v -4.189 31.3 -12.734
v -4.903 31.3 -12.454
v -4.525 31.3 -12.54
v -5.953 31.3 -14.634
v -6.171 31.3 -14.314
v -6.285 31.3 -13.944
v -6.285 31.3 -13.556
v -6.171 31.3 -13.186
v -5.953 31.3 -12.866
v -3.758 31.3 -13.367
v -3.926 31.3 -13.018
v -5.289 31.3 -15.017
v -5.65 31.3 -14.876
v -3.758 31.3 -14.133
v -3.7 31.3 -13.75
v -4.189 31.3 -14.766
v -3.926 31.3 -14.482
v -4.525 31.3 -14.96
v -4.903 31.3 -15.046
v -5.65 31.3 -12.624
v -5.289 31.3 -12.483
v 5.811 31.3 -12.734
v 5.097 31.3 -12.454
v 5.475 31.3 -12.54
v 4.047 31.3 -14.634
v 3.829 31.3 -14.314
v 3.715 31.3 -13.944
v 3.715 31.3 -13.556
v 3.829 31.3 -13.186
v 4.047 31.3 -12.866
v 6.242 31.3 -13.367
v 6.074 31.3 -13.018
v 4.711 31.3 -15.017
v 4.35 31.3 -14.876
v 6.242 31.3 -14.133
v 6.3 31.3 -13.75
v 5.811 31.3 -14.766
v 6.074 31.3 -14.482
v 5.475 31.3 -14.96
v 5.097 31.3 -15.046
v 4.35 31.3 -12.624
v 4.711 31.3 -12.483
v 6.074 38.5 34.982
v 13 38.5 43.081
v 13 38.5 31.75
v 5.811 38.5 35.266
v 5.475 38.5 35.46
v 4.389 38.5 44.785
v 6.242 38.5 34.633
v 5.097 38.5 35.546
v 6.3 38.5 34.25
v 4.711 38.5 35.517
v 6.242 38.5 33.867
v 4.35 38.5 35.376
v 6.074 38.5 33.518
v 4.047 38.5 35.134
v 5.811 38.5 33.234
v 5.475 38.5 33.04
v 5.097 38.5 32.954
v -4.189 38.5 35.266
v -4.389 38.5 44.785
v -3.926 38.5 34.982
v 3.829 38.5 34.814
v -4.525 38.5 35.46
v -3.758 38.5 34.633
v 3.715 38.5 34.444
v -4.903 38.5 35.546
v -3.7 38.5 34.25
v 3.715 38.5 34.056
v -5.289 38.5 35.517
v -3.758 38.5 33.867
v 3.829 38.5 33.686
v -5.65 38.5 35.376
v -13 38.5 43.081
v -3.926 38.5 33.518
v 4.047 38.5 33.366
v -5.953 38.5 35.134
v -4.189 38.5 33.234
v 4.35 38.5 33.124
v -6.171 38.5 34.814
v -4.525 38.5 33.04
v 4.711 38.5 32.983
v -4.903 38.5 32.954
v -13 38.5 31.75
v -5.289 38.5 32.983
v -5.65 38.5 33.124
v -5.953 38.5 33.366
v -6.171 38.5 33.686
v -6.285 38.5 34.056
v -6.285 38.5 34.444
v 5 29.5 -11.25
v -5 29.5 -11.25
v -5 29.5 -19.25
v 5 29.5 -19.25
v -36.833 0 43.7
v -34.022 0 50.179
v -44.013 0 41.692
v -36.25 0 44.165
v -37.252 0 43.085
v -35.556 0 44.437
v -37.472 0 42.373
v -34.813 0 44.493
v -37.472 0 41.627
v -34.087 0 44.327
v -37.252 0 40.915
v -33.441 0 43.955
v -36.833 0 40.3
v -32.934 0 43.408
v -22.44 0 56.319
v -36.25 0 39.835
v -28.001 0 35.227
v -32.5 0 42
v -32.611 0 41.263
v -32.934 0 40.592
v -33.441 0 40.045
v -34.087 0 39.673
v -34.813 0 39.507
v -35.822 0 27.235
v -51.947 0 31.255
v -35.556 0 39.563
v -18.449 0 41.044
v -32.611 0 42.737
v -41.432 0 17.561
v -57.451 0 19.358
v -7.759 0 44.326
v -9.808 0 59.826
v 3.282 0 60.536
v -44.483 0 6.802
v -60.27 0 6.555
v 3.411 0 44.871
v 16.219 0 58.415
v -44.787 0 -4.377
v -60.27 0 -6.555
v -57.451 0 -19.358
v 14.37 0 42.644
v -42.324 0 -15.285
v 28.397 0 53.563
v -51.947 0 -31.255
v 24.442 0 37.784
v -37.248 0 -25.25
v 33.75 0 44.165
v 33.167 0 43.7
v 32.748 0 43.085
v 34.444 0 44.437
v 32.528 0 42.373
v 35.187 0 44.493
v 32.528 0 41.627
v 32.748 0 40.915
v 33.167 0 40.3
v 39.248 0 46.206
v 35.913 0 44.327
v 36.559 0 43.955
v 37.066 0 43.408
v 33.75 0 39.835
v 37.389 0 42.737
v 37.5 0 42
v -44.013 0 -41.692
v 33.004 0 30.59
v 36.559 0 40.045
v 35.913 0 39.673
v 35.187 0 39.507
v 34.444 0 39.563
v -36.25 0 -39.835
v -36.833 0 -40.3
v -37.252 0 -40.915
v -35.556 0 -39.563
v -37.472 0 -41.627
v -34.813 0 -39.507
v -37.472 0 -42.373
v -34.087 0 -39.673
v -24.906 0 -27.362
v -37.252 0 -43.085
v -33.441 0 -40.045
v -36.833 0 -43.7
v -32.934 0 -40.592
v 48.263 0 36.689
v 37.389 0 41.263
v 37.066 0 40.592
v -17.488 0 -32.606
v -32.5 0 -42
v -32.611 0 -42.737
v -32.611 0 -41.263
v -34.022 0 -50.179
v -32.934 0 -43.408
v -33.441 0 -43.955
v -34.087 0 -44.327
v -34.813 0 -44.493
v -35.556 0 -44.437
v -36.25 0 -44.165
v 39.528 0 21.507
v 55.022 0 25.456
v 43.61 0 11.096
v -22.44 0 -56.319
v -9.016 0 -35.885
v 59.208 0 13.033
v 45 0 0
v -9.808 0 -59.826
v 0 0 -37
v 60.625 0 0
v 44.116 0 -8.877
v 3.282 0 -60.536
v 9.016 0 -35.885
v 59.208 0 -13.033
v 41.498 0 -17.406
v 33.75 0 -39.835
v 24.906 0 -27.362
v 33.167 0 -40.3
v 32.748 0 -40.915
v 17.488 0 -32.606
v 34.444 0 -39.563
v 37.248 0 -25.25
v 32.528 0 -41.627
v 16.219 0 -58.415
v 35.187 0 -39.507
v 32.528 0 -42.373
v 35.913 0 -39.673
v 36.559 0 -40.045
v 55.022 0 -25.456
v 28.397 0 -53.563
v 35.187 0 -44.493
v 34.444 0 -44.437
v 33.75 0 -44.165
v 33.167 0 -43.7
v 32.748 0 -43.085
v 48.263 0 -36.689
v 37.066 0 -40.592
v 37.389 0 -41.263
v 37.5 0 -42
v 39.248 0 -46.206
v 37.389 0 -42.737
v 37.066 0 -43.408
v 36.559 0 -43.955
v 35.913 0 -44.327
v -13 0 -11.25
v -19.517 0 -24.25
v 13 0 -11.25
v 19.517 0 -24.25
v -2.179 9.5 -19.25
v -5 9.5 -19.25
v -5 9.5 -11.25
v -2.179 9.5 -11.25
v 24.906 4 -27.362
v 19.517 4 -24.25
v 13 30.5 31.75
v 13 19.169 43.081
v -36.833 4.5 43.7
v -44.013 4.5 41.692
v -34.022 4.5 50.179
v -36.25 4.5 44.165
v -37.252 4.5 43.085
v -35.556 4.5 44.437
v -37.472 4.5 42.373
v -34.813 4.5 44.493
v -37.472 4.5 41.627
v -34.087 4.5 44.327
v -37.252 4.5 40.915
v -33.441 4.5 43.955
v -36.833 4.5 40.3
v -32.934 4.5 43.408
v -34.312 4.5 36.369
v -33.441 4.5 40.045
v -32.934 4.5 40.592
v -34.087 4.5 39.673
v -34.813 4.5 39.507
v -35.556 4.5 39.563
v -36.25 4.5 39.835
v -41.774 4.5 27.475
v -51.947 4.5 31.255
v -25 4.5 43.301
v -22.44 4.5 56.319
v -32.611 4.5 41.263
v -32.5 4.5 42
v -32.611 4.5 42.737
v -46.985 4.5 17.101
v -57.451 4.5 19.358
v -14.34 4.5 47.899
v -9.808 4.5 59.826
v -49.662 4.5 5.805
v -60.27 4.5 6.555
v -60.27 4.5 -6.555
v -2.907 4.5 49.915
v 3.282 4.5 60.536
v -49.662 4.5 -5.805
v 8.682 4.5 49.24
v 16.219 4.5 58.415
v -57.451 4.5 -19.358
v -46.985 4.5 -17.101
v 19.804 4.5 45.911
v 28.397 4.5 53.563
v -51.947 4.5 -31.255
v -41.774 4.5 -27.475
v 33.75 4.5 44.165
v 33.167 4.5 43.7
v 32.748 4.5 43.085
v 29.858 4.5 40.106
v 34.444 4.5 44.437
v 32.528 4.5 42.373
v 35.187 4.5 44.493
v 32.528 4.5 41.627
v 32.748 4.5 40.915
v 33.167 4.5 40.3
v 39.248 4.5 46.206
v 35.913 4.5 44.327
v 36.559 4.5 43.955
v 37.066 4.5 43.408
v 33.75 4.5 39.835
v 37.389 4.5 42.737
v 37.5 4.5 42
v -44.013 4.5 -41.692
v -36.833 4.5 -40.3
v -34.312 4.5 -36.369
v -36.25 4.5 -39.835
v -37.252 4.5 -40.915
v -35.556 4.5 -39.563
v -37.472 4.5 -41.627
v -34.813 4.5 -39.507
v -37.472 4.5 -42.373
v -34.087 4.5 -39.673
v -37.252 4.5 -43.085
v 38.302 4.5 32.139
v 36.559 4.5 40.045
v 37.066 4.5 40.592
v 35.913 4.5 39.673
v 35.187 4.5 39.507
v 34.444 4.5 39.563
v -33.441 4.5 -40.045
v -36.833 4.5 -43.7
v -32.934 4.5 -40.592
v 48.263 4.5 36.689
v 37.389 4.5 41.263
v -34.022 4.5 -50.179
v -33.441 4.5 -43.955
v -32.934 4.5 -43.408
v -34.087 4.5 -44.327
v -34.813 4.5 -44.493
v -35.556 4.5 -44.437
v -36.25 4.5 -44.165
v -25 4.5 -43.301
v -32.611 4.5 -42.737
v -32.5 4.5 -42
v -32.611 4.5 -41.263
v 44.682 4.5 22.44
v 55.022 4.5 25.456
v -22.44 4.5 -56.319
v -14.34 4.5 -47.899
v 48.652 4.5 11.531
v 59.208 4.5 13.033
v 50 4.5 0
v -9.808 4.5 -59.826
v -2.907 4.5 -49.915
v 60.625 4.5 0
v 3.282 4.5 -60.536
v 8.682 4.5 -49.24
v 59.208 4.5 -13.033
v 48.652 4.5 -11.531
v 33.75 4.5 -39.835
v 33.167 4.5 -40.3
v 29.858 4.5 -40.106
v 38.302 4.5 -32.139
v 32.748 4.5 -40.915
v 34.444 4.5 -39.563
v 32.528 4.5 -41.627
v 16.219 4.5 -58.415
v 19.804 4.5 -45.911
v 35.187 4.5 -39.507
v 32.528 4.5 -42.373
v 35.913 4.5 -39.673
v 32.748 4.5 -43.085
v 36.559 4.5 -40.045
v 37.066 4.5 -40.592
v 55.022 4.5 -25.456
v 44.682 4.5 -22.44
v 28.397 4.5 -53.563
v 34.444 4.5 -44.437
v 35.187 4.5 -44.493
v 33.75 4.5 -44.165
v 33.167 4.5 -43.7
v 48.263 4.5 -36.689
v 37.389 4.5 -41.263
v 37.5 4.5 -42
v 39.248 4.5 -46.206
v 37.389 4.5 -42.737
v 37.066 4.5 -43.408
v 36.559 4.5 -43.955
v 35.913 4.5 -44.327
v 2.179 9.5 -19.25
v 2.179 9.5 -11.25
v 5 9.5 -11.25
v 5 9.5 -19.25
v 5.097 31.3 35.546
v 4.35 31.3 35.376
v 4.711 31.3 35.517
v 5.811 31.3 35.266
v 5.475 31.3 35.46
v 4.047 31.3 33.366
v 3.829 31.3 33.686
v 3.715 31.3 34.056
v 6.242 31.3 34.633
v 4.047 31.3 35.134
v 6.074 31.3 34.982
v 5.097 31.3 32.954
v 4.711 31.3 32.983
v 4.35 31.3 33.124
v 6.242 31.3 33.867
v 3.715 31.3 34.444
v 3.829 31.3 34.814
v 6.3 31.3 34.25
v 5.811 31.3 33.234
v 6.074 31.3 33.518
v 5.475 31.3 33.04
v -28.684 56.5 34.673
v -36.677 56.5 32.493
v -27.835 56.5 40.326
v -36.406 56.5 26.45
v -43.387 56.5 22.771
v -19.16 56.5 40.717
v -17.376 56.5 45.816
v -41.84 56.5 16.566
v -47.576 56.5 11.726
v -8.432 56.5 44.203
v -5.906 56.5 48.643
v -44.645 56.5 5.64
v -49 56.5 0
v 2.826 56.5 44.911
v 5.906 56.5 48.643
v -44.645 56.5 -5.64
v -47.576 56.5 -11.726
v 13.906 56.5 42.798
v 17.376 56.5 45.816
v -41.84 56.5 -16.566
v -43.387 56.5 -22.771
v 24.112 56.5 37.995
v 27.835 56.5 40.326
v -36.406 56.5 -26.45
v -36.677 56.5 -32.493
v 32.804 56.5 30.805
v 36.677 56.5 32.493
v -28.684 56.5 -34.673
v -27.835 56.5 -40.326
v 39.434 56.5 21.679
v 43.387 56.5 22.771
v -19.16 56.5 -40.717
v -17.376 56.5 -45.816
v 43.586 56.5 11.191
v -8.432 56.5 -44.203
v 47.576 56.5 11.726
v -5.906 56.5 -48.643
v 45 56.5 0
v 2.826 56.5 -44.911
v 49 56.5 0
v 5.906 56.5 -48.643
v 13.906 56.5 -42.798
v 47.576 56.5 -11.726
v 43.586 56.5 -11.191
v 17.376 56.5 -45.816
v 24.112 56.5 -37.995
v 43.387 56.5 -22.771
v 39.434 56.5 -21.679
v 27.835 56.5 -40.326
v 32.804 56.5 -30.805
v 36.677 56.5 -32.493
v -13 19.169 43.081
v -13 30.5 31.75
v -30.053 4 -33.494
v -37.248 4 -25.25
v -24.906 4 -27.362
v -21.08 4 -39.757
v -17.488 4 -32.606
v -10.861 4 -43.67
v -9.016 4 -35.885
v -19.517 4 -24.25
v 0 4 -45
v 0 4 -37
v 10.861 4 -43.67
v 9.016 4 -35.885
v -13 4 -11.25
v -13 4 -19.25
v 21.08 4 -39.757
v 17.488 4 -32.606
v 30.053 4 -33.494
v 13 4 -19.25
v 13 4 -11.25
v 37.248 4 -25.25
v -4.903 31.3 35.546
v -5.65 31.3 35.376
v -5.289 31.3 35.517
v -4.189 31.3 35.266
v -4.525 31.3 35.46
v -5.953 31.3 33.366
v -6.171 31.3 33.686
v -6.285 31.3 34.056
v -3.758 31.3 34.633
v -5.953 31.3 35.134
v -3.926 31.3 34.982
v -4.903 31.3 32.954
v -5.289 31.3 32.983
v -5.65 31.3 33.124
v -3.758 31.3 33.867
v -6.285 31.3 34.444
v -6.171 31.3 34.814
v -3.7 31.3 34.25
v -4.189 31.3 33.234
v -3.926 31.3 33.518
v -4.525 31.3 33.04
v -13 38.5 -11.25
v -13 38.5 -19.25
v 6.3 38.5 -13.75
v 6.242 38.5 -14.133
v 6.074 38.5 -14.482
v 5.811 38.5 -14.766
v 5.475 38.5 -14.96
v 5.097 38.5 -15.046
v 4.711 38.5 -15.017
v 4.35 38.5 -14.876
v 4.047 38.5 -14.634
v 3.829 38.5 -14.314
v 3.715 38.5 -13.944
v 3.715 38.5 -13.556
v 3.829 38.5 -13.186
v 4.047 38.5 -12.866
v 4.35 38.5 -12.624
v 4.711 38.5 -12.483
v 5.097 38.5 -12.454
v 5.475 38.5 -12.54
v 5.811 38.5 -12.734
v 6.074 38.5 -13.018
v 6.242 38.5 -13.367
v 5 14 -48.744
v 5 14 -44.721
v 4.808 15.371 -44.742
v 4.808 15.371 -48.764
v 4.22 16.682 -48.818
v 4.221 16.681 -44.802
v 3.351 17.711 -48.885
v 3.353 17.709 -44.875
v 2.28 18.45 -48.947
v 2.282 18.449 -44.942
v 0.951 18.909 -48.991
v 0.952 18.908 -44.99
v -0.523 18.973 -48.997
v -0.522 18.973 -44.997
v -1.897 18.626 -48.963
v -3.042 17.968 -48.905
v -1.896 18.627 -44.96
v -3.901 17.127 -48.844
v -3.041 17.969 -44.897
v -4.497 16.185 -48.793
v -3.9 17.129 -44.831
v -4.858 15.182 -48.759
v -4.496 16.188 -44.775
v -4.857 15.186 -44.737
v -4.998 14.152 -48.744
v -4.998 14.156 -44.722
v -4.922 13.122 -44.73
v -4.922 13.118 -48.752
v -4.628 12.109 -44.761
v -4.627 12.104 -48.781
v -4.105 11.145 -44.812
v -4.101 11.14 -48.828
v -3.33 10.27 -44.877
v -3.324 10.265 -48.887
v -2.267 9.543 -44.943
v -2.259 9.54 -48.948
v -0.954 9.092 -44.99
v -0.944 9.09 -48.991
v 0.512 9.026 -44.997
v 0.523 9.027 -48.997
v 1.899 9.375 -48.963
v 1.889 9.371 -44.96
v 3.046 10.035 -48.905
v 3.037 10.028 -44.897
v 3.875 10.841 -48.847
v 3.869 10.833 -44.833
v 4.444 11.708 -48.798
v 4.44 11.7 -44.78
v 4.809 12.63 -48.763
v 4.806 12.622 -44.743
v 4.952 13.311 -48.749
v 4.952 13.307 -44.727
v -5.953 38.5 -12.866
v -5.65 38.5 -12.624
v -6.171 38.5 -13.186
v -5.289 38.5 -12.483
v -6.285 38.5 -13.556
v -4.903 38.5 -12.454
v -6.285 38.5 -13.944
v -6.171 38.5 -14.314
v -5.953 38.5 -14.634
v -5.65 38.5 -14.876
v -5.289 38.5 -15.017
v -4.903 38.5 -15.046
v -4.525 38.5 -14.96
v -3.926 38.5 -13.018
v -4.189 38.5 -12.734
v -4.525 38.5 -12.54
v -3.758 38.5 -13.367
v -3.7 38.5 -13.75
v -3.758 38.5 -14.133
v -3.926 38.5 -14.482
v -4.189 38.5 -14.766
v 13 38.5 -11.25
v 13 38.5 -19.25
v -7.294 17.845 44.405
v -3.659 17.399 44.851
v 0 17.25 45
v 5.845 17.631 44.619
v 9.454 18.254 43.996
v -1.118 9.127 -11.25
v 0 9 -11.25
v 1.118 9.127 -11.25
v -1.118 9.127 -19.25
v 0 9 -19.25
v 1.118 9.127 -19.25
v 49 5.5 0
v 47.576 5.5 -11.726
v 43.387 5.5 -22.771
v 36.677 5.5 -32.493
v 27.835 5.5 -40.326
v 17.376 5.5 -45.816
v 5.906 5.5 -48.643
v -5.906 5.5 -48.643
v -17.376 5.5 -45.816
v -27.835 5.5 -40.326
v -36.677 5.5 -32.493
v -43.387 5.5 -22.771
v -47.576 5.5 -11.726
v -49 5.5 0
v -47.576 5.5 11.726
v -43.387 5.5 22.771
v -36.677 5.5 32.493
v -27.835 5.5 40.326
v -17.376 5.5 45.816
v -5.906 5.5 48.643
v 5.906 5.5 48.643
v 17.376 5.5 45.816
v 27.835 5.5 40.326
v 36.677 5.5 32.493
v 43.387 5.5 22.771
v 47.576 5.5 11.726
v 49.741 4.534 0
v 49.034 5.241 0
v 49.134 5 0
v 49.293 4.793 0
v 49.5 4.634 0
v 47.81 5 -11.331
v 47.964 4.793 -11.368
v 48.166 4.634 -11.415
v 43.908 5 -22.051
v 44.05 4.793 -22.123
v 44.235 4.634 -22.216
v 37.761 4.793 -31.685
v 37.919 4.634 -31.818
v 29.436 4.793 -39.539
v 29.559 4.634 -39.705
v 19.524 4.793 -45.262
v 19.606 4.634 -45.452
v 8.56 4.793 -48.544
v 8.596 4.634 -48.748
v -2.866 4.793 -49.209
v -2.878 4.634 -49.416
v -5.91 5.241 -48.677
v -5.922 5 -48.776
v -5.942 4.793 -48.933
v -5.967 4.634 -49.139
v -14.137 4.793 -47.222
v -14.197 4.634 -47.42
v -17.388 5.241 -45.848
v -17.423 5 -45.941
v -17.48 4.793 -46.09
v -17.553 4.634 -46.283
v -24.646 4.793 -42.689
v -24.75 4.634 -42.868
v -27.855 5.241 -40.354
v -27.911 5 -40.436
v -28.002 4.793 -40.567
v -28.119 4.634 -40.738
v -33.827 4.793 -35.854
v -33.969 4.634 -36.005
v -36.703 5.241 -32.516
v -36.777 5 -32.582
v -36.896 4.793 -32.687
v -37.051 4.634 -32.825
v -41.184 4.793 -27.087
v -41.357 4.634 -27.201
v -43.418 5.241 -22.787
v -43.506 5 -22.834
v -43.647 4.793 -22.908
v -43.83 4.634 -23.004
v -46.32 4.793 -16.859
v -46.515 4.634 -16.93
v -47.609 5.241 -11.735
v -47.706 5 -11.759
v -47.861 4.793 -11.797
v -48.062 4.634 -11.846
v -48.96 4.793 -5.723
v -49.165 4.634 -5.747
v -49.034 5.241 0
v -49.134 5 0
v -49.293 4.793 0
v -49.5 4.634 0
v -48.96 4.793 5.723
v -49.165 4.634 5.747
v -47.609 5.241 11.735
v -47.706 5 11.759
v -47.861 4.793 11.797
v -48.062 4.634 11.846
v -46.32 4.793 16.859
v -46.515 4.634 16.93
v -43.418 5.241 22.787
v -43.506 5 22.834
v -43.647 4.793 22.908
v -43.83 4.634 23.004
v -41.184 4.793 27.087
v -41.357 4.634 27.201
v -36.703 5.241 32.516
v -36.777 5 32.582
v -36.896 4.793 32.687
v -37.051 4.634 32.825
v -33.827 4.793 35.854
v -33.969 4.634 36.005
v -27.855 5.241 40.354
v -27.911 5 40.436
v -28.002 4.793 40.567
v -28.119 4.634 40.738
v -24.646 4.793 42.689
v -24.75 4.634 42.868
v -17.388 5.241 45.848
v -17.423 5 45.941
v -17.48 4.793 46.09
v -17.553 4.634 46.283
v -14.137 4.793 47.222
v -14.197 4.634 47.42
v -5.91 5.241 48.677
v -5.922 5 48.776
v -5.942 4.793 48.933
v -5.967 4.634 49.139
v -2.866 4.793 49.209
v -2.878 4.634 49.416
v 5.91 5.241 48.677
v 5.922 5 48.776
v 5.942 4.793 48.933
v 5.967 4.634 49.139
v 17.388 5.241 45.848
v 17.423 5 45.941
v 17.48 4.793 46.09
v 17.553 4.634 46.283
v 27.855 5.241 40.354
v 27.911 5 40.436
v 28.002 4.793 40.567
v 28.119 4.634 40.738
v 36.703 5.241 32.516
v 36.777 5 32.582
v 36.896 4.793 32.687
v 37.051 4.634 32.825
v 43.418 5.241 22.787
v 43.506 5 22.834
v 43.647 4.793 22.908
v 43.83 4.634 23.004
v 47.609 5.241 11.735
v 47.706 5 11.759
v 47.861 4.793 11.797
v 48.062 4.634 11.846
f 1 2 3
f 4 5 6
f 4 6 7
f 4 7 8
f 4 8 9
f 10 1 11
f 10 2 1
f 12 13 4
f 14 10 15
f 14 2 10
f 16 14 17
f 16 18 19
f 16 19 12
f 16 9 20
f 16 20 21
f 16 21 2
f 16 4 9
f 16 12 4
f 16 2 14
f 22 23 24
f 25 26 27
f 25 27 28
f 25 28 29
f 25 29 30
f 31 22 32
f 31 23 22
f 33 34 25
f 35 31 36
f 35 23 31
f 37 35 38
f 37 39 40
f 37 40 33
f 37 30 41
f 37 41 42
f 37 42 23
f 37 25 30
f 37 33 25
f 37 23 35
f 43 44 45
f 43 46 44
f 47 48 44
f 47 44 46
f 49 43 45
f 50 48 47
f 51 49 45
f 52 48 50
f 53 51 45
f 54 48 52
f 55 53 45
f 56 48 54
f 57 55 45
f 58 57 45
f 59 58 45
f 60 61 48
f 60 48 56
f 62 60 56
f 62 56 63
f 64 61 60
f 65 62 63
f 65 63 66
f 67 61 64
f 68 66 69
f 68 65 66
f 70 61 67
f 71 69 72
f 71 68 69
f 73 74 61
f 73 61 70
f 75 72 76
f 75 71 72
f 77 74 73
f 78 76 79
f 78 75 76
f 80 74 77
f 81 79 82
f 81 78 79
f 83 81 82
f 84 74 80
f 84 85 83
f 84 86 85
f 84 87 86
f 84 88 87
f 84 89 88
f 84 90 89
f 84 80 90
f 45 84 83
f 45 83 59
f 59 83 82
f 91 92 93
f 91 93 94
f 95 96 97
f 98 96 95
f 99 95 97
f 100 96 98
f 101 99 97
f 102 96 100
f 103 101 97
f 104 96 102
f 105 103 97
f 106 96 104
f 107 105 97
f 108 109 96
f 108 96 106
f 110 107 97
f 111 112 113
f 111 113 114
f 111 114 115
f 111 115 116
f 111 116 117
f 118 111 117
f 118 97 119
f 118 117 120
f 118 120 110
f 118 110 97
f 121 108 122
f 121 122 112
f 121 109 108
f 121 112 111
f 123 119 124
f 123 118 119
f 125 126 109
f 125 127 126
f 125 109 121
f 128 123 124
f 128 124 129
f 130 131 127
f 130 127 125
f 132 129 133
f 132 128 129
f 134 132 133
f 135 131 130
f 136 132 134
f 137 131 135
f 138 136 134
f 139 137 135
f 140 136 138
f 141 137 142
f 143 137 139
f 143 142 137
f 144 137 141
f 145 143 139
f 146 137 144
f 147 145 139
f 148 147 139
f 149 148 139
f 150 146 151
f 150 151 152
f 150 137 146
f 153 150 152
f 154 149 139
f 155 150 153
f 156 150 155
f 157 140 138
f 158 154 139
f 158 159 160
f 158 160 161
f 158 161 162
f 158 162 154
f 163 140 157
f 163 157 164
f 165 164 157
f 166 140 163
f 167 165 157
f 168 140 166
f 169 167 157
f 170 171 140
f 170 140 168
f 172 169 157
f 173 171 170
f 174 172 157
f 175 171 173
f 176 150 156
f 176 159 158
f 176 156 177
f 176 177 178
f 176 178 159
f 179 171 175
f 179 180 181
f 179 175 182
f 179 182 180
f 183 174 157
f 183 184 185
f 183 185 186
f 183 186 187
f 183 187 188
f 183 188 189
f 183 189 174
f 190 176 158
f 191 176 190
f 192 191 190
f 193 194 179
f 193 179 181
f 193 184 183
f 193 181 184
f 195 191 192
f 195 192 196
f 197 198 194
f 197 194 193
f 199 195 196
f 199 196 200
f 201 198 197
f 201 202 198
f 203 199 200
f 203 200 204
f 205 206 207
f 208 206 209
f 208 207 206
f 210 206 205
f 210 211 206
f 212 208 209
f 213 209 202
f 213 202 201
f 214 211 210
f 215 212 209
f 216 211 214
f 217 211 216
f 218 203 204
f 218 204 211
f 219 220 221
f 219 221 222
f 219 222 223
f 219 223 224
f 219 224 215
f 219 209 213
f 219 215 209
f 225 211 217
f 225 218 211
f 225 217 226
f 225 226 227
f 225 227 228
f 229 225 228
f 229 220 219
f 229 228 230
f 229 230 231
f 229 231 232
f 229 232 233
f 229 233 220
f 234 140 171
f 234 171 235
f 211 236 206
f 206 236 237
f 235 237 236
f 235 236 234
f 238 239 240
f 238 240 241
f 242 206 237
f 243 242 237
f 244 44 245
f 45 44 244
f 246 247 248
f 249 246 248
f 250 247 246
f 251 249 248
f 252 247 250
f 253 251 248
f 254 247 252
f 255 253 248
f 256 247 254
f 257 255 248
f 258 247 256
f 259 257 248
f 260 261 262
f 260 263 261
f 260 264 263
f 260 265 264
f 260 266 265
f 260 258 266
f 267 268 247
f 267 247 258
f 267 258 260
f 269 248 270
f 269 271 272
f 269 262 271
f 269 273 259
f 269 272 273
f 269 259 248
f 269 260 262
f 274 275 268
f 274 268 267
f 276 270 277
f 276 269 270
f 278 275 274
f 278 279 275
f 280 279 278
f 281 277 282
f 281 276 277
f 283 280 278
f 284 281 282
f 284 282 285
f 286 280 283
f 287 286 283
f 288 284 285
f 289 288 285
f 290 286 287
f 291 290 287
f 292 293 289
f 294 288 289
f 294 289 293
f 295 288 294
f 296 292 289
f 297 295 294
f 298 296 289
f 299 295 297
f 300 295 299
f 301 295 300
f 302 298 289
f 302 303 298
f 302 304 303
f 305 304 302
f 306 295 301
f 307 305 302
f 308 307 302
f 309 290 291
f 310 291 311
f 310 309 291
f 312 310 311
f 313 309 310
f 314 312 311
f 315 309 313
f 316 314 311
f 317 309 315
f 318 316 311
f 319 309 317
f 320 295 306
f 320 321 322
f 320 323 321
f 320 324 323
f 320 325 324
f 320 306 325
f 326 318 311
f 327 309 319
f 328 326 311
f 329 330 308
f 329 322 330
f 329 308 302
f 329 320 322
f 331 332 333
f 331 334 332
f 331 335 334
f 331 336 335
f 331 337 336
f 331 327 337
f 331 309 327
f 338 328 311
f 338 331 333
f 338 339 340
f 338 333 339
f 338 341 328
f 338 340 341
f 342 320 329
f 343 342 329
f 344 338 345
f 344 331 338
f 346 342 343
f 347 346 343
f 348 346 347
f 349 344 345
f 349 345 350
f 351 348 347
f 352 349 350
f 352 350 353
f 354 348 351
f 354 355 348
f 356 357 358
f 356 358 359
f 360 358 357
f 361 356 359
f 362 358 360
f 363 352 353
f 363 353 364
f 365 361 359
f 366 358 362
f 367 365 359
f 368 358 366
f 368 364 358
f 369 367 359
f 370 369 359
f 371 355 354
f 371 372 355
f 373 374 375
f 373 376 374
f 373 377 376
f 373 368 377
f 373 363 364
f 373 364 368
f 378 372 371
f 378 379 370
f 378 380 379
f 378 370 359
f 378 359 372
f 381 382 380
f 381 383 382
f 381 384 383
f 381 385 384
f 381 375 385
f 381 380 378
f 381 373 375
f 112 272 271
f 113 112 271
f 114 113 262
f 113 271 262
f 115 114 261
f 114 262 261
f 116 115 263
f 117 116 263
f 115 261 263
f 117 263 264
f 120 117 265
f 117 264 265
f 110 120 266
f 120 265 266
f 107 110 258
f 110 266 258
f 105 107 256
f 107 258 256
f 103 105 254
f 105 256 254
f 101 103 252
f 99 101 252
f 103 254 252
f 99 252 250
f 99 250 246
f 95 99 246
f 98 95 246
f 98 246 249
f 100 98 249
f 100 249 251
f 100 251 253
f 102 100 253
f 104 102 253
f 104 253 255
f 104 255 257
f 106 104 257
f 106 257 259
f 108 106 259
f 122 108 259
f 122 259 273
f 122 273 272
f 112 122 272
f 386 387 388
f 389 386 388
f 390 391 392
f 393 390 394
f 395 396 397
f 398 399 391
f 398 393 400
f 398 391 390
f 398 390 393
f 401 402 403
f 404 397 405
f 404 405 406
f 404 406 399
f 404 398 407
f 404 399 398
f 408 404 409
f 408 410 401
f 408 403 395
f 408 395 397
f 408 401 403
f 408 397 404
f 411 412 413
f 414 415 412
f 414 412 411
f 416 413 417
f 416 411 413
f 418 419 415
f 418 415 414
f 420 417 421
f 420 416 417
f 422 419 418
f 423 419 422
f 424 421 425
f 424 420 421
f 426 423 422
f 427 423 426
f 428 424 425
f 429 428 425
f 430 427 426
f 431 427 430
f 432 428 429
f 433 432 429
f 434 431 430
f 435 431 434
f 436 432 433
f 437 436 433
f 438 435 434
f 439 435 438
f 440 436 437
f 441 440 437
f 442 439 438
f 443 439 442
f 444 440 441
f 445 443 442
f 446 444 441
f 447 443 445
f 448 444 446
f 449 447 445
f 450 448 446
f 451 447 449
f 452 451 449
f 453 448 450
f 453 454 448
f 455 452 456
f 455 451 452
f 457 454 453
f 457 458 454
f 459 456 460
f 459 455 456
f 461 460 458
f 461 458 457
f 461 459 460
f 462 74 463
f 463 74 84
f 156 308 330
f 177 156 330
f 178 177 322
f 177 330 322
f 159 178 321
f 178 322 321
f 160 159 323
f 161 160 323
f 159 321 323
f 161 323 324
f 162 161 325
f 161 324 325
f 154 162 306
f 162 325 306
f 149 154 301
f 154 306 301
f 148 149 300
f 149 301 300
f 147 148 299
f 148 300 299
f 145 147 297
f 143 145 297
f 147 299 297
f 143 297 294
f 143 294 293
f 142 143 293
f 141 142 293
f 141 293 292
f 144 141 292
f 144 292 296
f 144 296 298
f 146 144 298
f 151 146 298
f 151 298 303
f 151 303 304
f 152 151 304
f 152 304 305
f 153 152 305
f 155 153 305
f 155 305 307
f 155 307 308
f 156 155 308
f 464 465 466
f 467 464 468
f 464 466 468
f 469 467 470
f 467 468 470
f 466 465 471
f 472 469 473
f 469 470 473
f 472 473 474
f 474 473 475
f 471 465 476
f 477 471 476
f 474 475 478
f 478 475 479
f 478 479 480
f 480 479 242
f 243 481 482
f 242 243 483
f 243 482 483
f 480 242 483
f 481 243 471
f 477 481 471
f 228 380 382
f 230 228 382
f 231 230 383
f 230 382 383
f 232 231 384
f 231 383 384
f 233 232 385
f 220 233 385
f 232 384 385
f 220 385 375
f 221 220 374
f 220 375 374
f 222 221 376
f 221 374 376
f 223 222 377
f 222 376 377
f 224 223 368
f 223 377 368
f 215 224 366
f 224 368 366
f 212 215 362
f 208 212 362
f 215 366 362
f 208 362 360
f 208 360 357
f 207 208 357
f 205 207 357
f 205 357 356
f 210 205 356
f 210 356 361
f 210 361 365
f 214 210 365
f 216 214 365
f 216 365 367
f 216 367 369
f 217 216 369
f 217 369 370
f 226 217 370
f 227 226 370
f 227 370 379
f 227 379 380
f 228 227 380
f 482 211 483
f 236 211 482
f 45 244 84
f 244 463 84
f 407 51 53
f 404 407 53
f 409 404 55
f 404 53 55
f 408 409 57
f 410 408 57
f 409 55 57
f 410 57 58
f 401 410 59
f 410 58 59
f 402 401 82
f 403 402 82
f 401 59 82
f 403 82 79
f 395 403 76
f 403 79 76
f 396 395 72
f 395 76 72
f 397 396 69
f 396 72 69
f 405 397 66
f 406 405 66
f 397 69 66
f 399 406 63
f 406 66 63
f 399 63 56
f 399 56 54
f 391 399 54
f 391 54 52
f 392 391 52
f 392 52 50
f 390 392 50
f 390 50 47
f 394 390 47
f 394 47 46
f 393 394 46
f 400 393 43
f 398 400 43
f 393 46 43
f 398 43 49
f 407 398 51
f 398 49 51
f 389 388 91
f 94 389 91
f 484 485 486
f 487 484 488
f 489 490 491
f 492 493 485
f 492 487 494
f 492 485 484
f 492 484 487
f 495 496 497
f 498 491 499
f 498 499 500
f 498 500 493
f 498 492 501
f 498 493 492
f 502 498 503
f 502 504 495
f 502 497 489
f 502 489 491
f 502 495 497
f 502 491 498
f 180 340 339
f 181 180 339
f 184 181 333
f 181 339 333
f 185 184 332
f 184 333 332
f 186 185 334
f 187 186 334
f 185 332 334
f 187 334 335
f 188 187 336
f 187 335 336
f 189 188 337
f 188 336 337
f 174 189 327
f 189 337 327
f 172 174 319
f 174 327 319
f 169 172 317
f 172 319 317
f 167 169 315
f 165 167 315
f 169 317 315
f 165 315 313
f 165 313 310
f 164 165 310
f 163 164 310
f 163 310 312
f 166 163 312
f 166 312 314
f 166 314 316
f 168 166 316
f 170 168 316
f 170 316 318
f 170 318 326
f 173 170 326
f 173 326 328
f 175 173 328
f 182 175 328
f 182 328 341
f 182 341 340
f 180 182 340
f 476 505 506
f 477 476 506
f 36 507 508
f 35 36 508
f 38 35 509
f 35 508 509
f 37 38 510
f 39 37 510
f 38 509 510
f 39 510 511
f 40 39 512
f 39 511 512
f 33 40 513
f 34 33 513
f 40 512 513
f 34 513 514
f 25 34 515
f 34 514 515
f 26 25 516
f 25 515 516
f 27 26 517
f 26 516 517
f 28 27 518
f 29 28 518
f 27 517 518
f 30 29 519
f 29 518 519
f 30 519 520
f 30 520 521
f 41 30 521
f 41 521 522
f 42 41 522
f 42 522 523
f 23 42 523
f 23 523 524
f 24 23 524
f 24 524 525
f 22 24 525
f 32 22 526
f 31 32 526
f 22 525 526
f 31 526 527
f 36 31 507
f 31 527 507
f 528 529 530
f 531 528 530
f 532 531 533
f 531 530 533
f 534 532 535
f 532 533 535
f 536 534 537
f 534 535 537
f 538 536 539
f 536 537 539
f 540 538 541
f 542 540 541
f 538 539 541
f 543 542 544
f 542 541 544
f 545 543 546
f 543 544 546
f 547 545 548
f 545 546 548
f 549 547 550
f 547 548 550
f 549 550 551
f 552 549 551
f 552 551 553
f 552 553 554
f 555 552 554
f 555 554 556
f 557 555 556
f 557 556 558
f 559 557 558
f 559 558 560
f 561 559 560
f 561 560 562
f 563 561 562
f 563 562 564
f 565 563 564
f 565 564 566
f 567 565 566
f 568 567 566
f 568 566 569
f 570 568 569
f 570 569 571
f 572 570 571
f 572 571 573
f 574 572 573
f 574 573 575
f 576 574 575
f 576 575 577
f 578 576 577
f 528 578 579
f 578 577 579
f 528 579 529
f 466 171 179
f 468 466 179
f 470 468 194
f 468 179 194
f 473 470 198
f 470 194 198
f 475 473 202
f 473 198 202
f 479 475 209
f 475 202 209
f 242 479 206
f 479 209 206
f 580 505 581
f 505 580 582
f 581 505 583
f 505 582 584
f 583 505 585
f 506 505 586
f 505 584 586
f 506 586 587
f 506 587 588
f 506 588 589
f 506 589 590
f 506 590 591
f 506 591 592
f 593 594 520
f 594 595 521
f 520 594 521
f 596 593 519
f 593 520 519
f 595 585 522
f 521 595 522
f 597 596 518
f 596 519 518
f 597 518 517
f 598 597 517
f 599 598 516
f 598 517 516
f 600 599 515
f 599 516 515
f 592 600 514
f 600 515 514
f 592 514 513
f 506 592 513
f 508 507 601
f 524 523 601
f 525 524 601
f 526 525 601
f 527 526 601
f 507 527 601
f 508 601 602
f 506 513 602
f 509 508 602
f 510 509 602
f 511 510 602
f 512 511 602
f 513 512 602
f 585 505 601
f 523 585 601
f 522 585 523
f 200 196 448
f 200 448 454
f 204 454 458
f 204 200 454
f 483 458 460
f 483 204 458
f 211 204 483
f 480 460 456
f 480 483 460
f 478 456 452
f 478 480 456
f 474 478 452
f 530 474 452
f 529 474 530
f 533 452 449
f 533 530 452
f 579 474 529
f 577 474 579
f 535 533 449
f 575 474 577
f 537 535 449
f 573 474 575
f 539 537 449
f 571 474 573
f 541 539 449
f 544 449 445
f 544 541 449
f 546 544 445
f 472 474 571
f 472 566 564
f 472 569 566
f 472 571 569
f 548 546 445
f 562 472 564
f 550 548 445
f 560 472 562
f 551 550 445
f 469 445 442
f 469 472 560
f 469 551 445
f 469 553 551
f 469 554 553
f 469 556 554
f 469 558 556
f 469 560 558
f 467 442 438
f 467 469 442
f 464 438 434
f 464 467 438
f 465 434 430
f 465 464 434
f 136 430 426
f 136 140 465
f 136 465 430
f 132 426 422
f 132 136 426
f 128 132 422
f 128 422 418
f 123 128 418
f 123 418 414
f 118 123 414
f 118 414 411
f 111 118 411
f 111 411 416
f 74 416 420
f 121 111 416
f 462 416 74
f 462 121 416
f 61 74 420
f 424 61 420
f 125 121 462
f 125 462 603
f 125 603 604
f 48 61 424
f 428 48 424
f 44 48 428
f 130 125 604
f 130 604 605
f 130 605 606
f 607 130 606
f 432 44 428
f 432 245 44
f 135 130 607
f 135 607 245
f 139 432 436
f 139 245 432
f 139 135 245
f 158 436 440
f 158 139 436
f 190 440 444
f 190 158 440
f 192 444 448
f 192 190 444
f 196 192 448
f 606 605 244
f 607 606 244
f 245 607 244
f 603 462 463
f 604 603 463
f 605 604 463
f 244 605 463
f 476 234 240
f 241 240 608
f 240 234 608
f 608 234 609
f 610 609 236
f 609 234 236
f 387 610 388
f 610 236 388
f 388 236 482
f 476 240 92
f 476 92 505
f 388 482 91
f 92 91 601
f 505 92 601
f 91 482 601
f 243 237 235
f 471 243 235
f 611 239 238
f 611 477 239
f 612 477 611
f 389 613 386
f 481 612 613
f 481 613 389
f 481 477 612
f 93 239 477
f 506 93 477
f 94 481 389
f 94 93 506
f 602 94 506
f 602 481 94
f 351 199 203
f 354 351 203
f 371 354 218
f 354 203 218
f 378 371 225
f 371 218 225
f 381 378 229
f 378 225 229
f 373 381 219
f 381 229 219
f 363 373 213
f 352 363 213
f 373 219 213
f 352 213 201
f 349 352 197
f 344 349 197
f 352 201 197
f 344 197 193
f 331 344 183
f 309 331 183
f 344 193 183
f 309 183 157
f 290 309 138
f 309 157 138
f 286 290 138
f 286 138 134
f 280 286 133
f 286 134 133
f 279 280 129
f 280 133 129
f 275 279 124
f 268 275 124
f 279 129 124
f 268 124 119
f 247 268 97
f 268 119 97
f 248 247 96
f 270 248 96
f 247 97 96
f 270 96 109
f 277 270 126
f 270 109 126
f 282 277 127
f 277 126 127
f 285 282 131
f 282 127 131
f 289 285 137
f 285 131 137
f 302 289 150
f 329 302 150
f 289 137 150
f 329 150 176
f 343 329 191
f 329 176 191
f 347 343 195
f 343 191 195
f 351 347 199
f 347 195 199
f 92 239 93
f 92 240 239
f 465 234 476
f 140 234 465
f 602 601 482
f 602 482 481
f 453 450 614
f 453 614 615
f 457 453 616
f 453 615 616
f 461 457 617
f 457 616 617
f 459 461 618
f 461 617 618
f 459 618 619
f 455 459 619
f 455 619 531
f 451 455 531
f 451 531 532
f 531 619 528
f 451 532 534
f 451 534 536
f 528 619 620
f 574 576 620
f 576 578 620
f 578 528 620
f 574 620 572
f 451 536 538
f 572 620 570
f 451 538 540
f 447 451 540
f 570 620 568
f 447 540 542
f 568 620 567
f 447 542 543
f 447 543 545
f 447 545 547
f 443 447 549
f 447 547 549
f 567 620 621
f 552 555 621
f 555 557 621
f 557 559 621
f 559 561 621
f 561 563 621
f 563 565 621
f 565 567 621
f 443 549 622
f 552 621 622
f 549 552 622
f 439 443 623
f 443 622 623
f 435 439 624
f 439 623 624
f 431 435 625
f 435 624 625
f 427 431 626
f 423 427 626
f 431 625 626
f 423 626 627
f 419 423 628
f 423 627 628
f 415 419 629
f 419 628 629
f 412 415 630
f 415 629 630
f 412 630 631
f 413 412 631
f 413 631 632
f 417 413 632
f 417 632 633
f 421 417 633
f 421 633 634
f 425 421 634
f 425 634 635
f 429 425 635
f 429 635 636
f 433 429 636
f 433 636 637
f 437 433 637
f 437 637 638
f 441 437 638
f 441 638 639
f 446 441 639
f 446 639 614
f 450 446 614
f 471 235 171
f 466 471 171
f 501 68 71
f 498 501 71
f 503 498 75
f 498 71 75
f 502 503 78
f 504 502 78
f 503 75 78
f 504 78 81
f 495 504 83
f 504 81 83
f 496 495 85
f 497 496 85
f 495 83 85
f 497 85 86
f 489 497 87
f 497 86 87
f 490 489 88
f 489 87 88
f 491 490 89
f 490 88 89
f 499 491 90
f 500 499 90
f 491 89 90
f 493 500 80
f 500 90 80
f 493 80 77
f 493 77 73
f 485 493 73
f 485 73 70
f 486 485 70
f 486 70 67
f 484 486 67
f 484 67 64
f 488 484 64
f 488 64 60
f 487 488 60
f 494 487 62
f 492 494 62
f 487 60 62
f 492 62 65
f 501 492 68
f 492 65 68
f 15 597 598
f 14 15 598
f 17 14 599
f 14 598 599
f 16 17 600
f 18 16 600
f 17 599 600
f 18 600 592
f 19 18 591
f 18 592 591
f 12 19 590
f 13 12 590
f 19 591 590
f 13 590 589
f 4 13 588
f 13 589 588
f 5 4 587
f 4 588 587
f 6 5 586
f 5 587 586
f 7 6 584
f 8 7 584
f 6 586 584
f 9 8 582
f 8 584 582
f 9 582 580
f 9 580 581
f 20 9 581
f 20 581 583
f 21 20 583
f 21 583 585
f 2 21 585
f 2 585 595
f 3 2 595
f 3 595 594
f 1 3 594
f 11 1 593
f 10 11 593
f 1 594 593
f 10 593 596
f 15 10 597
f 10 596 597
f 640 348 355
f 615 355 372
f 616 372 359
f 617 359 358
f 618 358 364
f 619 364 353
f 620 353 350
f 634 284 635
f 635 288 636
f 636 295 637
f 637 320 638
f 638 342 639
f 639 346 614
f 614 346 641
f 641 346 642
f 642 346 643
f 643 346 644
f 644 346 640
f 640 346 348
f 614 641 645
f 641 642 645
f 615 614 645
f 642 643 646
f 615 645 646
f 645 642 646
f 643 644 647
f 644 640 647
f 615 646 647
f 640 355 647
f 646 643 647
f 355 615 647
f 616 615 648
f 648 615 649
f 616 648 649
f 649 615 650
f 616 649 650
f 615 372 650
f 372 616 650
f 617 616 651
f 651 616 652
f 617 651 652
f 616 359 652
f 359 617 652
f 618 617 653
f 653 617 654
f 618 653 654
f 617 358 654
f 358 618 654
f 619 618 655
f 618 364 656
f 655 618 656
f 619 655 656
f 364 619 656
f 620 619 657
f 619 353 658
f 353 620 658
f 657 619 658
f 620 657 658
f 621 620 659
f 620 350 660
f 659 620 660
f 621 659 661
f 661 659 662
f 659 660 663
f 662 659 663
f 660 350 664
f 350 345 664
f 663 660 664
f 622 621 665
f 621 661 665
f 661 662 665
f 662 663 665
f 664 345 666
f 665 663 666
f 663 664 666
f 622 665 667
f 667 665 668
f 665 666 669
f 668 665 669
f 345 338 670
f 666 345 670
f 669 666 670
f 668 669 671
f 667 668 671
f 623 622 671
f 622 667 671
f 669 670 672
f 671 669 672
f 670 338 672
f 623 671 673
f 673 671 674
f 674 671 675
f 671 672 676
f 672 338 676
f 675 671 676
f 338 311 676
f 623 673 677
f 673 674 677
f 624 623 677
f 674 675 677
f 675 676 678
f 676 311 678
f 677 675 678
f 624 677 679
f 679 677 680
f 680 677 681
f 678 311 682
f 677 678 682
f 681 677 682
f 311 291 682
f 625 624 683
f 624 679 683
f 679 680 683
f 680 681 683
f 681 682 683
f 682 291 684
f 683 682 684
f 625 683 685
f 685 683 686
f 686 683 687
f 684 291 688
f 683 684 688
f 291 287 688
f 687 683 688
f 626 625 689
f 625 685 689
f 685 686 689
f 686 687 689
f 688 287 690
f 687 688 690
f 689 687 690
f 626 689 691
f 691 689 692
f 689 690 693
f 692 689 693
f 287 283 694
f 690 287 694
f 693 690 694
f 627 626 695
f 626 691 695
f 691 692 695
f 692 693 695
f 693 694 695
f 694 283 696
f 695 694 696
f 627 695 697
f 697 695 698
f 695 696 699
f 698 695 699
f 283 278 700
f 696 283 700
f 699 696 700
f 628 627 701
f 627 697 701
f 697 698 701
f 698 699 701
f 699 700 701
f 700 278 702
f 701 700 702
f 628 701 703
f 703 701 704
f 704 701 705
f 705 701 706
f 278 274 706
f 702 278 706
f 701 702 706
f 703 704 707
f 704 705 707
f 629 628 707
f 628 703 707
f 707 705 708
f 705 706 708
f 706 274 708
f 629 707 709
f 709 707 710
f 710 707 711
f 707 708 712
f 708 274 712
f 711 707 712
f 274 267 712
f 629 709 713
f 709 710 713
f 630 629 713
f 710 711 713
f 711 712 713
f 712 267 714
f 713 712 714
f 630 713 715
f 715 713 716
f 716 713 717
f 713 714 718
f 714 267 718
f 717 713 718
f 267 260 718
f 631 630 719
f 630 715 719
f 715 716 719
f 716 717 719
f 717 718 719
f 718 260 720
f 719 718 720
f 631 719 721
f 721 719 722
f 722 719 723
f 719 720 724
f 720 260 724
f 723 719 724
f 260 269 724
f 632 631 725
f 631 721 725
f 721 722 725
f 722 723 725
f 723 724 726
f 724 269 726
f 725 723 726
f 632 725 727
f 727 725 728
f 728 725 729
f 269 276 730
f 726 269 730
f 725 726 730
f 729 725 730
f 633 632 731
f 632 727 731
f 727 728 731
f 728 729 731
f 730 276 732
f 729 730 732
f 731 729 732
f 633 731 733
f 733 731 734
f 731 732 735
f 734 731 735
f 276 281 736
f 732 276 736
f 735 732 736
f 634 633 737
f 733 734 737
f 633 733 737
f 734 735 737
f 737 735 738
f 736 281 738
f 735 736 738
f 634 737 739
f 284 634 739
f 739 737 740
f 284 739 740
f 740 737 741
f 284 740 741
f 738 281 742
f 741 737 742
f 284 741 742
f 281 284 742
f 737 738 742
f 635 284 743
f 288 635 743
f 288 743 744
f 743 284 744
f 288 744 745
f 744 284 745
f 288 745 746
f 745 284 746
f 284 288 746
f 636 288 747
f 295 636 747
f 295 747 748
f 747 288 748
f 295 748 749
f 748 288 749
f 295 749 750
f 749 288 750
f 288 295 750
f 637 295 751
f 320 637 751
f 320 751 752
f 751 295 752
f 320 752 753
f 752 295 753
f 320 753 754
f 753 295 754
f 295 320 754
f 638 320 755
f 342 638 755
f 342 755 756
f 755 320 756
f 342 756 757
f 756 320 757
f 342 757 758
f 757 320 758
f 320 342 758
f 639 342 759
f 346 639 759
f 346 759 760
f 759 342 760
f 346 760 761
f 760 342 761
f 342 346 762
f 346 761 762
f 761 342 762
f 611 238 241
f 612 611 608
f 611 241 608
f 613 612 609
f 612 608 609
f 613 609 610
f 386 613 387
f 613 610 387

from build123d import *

# Parameters (mm, degrees)
SKETCH2_R           = 60.625
SKETCH2_R_2         = 45
BOSS_EXTRUDE1_DEPTH = 4.5
SKETCH3_R           = 49
SKETCH3_R_2         = 45
BOSS_EXTRUDE2_DEPTH = 52
SKETCH4_W           = 13.25
SKETCH4_H           = 8
SKETCH4_W_2         = 8
SKETCH4_H_2         = 38.5
BOSS_EXTRUDE3_DEPTH = 13
SKETCH5_W           = 10
SKETCH5_H           = 20
CUT_EXTRUDE1_DEPTH  = 26
SKETCH6_R           = 5
CUT_EXTRUDE2_DEPTH  = 50.375
SKETCH7_R           = 1.3
CUT_EXTRUDE3_DEPTH  = 7.2
BOSS_EXTRUDE4_DEPTH = 4
FILLET1_R           = 1
SKETCH9_R           = 2.5
CUT_EXTRUDE4_DEPTH  = 5.5000001


with BuildPart() as part:
    # Sketch2 → Boss-Extrude1 (new body)
    with BuildSketch(Plane(origin=(0, 0, 0), x_dir=(1, 0, 0), z_dir=(0, 1, 0))):
        Circle(SKETCH2_R)
        Circle(SKETCH2_R_2, mode=Mode.SUBTRACT)
    extrude(amount=BOSS_EXTRUDE1_DEPTH)

    # Sketch3 → Boss-Extrude2 (add)
    with BuildSketch(Plane(origin=(0, 4.5, 0), x_dir=(1, 0, 0), z_dir=(0, 1, 0))):
        Circle(SKETCH3_R)
        Circle(SKETCH3_R_2, mode=Mode.SUBTRACT)
    extrude(amount=BOSS_EXTRUDE2_DEPTH)

    # Sketch4 → Boss-Extrude3 (add, symmetric)
    with BuildSketch(Plane(origin=(0, 0, 0), x_dir=(0, 0, -1), z_dir=(1, 0, 0))):
        Polygon((-31.75, 30.5), (-45, 30.5), (-45, 17.25), align=None)
        with Locations((-38.375, 34.5)):
            Rectangle(SKETCH4_W, SKETCH4_H)
        with Locations((15.25, 19.25)):
            Rectangle(SKETCH4_W_2, SKETCH4_H_2)
    extrude(amount=BOSS_EXTRUDE3_DEPTH, both=True)

    # Sketch5 → Cut-Extrude1 (cut)
    with BuildSketch(Plane.XY):
        with Locations((0, 19.5)):
            Rectangle(SKETCH5_W, SKETCH5_H)
    extrude(amount=-CUT_EXTRUDE1_DEPTH, mode=Mode.SUBTRACT)

    # Sketch6 → Cut-Extrude2 (cut, through all)
    with BuildSketch(Plane.XY.offset(-11.25)):
        with Locations((0, 14)):
            Circle(SKETCH6_R)
    extrude(amount=-CUT_EXTRUDE2_DEPTH, mode=Mode.SUBTRACT)

    # Sketch7 → Cut-Extrude3 (cut)
    with BuildSketch(Plane(origin=(0, 38.5, 0), x_dir=(1, 0, 0), z_dir=(0, 1, 0))):
        with Locations((-5, 13.75)):
            Circle(SKETCH7_R)
        with Locations((5, 13.75)):
            Circle(SKETCH7_R)
        with Locations((-5, -34.25)):
            Circle(SKETCH7_R)
        with Locations((5, -34.25)):
            Circle(SKETCH7_R)
    extrude(amount=-CUT_EXTRUDE3_DEPTH, mode=Mode.SUBTRACT)

    # Sketch8 → Boss-Extrude4 (add)
    with BuildSketch(Plane.XZ):
        with BuildLine():
            Line((13, -11.25), (-13, -11.25))
            Line((-13, -11.25), (-37.248431585, -25.249838503))
            ThreePointArc((-37.248431585, -25.249838503), (0, -45), (37.248431585, -25.249838503))
            Line((37.248431585, -25.249838503), (13, -11.25))
        make_face()
        with BuildLine():
            Line((-19.516660498, -24.25), (-24.906460381, -27.361802413))
            ThreePointArc((-24.906460381, -27.361802413), (0, -37), (24.906460381, -27.361802413))
            Line((24.906460381, -27.361802413), (19.516660498, -24.25))
            Line((19.516660498, -24.25), (-19.516660498, -24.25))
        make_face(mode=Mode.SUBTRACT)
    extrude(amount=-BOSS_EXTRUDE4_DEPTH)

    # Fillet1
    fillet1_edges = [part.edges().sort_by_distance(p)[0] for p in [
        (-49, 4.5, 0),
    ]]
    fillet(fillet1_edges, radius=FILLET1_R)

    # Sketch9 → Cut-Extrude4 (cut, through all)
    with BuildSketch(Plane(origin=(0, 4.5, 0), x_dir=(1, 0, 0), z_dir=(0, 1, 0))):
        with Locations((35, 42)):
            Circle(SKETCH9_R)
        with Locations((35, -42)):
            Circle(SKETCH9_R)
        with Locations((-35, -42)):
            Circle(SKETCH9_R)
        with Locations((-35, 42)):
            Circle(SKETCH9_R)
    extrude(amount=-CUT_EXTRUDE4_DEPTH, mode=Mode.SUBTRACT)


solid = part.part
